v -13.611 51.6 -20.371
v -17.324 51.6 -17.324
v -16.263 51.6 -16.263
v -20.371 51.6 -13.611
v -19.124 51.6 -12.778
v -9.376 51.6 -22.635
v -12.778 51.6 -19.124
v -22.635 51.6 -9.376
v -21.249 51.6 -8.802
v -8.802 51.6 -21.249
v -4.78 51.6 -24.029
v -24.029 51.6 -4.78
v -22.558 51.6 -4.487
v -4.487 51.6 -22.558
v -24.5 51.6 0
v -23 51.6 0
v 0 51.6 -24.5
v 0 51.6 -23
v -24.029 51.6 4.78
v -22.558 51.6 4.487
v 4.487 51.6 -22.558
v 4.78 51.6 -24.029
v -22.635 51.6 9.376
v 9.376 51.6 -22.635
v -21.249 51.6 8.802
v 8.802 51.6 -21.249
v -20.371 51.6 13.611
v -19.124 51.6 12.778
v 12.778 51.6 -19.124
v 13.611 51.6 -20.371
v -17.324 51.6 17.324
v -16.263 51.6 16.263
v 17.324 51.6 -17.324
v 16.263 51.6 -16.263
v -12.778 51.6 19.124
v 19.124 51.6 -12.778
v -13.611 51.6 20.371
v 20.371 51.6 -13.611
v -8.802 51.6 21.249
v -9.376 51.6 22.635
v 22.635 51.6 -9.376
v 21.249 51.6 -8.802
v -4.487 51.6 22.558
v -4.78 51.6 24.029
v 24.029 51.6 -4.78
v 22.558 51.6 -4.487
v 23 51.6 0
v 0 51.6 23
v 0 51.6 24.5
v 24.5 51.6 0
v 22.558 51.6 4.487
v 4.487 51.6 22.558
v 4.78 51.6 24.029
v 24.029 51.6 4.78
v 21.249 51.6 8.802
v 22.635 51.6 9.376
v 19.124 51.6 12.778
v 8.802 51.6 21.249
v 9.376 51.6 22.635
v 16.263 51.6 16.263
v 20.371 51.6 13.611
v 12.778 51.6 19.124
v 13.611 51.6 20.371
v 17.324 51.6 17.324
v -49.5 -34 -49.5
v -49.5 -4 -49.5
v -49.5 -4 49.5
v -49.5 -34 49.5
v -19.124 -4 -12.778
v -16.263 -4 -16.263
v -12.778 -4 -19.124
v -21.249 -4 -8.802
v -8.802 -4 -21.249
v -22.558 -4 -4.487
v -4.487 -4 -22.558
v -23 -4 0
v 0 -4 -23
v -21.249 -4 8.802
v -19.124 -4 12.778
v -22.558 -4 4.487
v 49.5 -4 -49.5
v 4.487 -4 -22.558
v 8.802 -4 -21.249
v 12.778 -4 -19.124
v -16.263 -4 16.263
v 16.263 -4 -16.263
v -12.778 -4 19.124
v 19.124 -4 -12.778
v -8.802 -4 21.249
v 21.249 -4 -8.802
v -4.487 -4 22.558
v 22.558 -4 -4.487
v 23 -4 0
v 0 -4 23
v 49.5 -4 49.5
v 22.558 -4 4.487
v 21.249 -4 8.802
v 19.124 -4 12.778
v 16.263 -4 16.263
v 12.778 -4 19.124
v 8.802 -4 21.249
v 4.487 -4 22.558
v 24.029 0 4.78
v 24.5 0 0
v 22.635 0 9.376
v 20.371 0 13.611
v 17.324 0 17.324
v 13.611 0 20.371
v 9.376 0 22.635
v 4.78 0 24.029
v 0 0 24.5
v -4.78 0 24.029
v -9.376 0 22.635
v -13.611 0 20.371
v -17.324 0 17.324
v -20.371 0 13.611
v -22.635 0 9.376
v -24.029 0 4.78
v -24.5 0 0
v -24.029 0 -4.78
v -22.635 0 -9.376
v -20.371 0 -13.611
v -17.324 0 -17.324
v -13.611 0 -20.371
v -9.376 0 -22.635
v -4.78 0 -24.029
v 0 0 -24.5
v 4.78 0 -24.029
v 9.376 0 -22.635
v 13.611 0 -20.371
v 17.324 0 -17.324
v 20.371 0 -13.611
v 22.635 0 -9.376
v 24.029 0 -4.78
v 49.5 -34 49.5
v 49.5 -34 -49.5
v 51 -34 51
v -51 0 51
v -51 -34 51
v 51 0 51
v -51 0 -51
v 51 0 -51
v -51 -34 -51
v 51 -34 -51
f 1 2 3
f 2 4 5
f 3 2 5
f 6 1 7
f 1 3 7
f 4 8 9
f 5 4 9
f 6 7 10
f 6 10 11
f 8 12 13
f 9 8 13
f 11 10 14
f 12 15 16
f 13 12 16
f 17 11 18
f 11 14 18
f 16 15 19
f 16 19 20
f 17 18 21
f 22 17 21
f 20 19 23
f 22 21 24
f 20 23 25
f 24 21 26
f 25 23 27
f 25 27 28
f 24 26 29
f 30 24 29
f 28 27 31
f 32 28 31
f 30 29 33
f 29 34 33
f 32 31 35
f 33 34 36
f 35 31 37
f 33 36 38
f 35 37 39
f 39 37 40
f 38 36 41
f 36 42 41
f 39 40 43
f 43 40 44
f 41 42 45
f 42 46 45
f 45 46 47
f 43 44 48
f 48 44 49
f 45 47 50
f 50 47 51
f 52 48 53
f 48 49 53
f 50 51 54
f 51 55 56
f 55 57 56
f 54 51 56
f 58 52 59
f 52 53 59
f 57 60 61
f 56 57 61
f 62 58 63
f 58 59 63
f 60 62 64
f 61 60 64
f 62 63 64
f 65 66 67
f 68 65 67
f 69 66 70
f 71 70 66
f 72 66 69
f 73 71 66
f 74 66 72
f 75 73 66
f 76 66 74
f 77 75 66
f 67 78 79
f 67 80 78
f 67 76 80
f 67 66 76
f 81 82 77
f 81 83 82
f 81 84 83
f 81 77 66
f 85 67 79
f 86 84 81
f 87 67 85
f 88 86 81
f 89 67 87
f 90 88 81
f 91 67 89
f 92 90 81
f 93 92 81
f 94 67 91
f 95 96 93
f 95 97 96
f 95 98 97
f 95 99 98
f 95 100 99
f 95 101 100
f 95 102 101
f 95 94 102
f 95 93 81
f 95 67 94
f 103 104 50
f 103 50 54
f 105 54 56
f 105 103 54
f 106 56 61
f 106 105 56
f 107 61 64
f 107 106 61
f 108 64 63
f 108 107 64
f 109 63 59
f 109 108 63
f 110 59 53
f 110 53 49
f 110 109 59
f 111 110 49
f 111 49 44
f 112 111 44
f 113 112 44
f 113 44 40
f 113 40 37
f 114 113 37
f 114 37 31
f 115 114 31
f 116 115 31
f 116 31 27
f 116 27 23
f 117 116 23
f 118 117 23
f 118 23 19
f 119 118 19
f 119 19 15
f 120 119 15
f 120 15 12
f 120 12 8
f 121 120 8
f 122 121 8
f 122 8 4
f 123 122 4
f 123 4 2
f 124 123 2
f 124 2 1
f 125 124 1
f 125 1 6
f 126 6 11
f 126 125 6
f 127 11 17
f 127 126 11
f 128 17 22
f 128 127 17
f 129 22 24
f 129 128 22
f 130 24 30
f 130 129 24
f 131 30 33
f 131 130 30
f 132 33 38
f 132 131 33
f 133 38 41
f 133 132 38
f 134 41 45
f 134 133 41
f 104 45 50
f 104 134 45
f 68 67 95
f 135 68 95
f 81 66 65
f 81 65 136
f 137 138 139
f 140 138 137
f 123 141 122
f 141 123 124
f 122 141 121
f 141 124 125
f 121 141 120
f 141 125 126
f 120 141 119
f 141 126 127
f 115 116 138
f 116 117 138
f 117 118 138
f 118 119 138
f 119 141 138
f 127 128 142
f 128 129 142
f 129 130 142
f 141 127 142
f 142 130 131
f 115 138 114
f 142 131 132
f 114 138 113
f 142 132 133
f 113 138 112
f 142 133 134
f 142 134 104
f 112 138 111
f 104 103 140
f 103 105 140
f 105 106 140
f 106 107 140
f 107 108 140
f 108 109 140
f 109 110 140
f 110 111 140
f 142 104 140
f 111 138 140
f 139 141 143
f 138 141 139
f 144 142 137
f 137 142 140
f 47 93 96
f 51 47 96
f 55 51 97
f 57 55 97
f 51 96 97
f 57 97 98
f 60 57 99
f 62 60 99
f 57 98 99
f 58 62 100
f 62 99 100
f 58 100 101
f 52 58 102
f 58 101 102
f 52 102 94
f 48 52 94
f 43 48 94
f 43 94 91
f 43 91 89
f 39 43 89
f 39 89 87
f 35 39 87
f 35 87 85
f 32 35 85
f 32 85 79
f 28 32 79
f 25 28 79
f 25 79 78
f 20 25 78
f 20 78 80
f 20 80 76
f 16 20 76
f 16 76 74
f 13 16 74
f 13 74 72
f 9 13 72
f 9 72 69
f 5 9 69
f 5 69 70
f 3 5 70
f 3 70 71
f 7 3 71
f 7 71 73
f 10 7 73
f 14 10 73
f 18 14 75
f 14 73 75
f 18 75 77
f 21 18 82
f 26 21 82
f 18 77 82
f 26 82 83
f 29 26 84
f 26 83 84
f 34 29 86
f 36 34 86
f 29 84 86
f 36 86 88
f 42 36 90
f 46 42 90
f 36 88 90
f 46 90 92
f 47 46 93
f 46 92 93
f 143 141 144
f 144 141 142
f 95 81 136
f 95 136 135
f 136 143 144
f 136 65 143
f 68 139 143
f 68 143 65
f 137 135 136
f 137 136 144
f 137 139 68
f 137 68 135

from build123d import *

# Parameters (mm, degrees)
F0_W          = 102
F0_H          = 102
F0_W_2        = 96
F0_H_2        = 96
F1_DEPTH      = 4
F2_W          = 102
F2_H          = 102
F2_W_2        = 99
F2_H_2        = 99
F3_DEPTH      = 30
F3_DEPTH_BACK = 4
F4_R          = 23
F5_DEPTH      = 25
F6_R          = 24.5
F6_R_2        = 23
F7_DEPTH      = 55.6


with BuildPart() as f1:
    # F0 (on Front) → F1 (new body)
    with BuildSketch(Plane.XZ):
        Rectangle(F0_W, F0_H)
        Rectangle(F0_W_2, F0_H_2, mode=Mode.SUBTRACT)
        Rectangle(F0_W_2, F0_H_2)
    extrude(amount=F1_DEPTH)

    # F2 (on face) → F3 (join, two sides)
    with BuildSketch(Plane.XZ.offset(4)) as f3_sk:
        Rectangle(F2_W, F2_H)
        Rectangle(F2_W_2, F2_H_2, mode=Mode.SUBTRACT)
    extrude(amount=F3_DEPTH)
    extrude(f3_sk.sketch, amount=-F3_DEPTH_BACK)

    # F4 (on face) → F5 (cut)
    with BuildSketch(Plane.XZ.offset(4)):
        Circle(F4_R)
    extrude(amount=-F5_DEPTH, mode=Mode.SUBTRACT)

    # F6 (on face) → F7 (join)
    with BuildSketch(Plane.XZ.offset(4)):
        Circle(F6_R)
        Circle(F6_R_2, mode=Mode.SUBTRACT)
    extrude(amount=-F7_DEPTH)


solid = f1.part
